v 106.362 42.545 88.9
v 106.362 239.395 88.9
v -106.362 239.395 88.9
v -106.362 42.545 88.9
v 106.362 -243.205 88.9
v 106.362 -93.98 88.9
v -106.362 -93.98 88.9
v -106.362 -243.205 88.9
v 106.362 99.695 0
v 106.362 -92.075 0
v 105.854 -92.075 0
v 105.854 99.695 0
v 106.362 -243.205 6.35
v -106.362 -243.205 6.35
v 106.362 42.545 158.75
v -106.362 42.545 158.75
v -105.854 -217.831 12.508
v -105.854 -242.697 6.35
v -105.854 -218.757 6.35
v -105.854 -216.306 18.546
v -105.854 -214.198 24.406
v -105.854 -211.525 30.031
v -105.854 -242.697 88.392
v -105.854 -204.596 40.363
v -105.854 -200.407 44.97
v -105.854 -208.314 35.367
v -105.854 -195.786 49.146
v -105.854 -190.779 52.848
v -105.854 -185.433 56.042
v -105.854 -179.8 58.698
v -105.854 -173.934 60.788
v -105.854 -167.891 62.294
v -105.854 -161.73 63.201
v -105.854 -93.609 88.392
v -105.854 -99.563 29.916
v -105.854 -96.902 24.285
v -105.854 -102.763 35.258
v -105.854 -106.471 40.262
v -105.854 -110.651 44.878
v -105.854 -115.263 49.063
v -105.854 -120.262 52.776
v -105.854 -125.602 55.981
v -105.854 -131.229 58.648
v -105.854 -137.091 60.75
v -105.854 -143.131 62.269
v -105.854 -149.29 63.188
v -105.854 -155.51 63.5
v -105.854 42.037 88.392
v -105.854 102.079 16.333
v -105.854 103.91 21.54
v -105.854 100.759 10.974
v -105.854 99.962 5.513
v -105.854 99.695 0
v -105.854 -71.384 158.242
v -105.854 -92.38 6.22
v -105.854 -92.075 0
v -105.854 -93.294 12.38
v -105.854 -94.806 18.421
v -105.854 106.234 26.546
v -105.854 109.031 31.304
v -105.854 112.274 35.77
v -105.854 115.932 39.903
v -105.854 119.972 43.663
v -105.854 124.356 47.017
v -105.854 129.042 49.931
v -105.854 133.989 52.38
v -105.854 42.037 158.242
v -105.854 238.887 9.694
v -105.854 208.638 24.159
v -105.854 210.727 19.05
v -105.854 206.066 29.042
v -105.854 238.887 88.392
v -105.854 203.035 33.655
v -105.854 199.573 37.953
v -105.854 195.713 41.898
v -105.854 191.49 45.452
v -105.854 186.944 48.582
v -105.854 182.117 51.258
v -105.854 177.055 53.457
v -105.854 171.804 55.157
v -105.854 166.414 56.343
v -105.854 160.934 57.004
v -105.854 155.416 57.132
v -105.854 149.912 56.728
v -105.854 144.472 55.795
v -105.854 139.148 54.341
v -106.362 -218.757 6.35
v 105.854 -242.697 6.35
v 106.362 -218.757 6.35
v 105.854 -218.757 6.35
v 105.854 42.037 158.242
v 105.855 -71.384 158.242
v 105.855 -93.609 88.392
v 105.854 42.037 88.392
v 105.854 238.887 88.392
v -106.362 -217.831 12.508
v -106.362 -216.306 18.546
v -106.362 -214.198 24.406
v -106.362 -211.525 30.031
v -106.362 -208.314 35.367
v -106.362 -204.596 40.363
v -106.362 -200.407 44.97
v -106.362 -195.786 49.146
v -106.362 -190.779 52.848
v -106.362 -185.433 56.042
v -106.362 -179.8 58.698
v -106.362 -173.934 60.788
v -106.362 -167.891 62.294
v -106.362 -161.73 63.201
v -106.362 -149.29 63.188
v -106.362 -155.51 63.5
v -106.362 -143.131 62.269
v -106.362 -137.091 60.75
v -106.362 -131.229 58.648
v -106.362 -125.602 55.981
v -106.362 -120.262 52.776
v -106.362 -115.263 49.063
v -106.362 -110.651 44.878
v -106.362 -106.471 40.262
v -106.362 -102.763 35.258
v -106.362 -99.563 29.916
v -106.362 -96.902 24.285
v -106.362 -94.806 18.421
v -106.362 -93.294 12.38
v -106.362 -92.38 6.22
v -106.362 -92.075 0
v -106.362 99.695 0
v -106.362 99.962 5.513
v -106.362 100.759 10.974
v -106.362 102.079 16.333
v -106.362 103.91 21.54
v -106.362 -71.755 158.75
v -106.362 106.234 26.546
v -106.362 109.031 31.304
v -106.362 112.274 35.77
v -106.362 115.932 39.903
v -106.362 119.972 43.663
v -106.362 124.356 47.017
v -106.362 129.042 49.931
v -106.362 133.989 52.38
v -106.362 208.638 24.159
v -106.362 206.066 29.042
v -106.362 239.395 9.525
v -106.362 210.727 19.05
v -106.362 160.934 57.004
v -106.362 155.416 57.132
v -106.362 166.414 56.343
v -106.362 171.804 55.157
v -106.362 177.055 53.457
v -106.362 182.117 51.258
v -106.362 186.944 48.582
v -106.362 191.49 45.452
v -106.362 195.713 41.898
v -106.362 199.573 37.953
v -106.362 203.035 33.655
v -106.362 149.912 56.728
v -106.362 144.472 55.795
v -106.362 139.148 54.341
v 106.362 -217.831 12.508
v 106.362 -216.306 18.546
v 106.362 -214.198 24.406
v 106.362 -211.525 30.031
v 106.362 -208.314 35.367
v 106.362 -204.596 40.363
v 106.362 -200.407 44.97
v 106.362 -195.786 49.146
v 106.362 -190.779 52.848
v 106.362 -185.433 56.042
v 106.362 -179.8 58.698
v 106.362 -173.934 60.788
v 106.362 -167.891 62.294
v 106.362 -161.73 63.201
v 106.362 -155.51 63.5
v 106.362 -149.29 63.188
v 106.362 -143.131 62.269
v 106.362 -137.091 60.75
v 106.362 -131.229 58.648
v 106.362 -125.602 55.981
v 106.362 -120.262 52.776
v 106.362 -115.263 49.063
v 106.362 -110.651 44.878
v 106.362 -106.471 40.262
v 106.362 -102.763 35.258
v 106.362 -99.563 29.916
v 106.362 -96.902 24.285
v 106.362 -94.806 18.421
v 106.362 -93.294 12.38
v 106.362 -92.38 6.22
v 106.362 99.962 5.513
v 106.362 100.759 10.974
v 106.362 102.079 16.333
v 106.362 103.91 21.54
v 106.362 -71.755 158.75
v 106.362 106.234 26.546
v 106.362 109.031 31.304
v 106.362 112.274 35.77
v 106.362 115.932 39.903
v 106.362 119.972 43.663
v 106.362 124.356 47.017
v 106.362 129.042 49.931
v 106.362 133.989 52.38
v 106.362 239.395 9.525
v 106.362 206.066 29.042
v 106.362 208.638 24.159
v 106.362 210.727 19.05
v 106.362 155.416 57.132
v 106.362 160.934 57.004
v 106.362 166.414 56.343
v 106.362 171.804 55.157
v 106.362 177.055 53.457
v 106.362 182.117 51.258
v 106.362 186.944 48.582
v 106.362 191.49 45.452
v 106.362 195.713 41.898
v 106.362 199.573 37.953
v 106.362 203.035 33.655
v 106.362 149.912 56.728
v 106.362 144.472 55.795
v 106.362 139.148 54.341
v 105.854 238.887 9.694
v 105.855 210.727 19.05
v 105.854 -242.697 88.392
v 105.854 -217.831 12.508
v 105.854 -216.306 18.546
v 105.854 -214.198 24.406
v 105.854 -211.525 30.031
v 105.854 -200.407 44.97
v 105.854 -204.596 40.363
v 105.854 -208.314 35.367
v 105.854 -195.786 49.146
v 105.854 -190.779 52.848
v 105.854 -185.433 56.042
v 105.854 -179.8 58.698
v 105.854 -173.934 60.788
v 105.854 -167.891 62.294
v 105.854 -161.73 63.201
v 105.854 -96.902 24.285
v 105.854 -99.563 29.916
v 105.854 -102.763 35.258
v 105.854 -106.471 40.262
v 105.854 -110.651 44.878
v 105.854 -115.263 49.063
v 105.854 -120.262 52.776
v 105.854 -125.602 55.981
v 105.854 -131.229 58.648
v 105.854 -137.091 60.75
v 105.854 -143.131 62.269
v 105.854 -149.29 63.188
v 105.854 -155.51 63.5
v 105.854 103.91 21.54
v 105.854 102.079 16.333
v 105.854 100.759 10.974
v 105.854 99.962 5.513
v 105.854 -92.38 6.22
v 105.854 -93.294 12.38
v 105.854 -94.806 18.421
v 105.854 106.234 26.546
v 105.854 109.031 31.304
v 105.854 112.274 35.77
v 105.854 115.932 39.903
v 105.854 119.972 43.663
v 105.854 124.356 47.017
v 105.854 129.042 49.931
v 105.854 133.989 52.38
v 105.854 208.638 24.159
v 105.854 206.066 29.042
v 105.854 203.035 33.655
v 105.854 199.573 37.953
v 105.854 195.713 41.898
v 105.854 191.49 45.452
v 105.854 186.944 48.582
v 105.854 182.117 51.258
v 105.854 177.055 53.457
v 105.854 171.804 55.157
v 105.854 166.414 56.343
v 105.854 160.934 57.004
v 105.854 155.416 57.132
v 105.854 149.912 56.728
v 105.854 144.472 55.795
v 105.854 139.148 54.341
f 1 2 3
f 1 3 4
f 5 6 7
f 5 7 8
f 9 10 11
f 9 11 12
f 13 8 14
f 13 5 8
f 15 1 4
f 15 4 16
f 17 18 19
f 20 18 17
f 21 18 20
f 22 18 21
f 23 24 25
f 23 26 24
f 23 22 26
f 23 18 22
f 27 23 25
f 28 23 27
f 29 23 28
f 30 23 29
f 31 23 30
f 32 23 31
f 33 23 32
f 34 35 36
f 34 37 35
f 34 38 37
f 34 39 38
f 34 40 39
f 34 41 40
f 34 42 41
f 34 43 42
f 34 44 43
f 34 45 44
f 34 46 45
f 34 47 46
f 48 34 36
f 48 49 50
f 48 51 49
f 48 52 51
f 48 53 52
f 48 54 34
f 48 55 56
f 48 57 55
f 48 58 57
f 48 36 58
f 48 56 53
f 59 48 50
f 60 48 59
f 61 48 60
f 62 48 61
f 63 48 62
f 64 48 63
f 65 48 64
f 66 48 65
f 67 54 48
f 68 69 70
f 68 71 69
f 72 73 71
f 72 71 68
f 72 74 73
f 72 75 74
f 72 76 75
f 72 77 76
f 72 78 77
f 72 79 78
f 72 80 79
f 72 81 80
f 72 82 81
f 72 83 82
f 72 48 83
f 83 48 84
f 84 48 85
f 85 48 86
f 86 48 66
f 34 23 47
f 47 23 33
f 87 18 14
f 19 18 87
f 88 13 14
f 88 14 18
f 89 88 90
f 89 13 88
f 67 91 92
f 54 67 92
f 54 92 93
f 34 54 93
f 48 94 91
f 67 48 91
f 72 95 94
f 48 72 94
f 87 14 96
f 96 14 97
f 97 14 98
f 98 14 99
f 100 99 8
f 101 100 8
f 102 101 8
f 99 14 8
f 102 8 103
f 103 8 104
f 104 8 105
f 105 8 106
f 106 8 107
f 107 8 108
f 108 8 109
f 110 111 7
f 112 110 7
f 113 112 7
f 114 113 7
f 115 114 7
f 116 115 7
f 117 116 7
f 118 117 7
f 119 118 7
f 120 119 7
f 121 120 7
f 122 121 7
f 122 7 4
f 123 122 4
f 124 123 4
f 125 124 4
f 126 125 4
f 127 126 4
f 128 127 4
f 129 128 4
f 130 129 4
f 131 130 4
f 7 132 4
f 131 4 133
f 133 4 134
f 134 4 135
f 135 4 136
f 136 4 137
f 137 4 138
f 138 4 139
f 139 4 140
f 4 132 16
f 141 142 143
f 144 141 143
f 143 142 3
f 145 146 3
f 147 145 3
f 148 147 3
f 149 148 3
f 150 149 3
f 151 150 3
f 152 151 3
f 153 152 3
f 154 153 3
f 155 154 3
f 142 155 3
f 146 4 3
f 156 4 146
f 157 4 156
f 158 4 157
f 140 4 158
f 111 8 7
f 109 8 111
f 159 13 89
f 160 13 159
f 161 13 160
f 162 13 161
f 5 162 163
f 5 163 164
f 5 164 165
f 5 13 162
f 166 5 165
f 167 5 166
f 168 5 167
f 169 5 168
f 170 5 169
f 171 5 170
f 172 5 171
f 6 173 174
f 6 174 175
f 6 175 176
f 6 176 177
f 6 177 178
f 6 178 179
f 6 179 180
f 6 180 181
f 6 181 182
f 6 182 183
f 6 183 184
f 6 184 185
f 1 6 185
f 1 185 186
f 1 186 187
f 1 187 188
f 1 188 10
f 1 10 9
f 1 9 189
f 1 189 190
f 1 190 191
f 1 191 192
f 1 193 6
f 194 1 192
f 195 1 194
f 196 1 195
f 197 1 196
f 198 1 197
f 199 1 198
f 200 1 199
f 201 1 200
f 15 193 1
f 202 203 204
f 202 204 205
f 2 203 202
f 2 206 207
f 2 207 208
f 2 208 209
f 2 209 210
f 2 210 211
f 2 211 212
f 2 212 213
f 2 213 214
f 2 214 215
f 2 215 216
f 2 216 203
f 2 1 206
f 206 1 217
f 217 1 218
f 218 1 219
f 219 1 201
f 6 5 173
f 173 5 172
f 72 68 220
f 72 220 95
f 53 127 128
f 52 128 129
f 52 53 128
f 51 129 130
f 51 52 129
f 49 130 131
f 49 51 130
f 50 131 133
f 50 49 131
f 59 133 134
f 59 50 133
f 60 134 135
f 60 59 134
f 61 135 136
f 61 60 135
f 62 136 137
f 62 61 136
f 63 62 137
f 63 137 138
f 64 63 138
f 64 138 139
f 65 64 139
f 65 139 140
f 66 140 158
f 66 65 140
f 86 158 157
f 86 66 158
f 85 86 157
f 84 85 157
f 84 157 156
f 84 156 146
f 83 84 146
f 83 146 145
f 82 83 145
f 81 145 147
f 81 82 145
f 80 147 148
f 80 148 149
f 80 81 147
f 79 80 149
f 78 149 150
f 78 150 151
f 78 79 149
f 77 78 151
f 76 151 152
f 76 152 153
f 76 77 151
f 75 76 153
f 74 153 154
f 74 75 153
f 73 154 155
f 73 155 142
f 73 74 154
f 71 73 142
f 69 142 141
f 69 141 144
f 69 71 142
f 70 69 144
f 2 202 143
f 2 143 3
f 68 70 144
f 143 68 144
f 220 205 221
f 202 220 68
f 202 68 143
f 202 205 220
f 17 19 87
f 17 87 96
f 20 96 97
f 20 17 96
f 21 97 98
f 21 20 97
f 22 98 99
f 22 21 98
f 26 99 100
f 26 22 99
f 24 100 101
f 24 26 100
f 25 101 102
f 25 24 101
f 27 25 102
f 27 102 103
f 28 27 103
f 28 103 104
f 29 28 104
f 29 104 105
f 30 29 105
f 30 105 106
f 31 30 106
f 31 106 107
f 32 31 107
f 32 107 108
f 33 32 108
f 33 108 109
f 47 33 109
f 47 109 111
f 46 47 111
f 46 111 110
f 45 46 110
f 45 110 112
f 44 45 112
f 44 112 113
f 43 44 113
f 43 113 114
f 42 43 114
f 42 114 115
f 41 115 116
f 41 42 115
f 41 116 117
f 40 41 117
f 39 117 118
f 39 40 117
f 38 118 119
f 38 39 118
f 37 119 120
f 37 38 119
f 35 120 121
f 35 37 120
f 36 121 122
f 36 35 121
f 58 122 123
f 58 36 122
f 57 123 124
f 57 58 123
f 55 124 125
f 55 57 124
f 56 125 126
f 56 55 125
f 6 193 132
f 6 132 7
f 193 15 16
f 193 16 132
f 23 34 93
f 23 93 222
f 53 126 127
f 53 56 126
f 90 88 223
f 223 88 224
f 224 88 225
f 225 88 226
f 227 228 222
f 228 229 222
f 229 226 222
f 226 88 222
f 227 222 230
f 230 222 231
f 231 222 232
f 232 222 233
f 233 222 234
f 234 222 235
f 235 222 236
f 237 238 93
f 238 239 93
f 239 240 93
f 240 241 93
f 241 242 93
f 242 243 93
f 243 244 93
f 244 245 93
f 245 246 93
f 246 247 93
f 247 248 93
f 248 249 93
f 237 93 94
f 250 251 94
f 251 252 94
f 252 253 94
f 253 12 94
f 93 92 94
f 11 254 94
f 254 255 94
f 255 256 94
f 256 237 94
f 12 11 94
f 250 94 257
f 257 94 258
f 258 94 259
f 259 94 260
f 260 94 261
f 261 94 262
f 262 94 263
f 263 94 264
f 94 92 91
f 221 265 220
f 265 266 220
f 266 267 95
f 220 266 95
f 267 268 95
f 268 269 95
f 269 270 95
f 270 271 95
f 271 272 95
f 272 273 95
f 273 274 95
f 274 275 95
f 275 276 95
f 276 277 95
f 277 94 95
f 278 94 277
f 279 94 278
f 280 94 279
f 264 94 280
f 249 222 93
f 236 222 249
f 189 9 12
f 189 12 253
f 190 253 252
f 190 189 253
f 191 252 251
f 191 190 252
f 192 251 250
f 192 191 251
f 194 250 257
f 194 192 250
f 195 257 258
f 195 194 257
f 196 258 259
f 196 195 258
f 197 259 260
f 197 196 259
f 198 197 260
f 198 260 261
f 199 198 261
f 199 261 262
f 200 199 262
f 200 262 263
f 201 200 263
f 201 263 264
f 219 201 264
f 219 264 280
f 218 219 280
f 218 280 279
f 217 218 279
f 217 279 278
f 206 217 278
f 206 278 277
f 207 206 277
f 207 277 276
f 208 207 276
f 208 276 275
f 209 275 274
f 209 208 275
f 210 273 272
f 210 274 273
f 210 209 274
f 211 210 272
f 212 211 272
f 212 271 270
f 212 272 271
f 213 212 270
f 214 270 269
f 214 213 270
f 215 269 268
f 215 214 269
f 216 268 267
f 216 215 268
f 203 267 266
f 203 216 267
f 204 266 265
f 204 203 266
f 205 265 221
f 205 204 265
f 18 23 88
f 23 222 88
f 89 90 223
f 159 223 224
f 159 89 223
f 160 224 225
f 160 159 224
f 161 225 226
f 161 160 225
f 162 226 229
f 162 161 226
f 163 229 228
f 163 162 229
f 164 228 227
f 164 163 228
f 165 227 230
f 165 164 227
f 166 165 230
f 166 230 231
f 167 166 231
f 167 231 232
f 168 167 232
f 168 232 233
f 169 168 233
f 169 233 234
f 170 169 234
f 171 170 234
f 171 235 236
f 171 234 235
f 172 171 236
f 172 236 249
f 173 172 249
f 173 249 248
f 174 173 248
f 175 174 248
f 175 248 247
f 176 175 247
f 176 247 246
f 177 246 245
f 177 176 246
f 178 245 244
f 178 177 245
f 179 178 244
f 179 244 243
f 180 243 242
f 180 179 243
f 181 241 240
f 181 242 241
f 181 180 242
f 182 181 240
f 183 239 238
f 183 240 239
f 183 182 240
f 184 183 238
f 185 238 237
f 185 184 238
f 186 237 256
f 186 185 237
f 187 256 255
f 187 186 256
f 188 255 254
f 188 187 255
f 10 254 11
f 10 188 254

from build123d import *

# Parameters (mm, degrees)
F1_DEPTH = 106.3625
F2_T     = -0.508


with BuildPart() as f1:
    # F0 (on Right) → F1 (new body, symmetric)
    with BuildSketch(Plane.YZ):
        with BuildLine():
            ThreePointArc((-218.7567022563, 6.35), (-152.3960137837, 63.4203756425), (-92.075, 0))
            Line((-92.075, 0), (0, 0))
            Line((0, 0), (99.695, 0))
            ThreePointArc((99.695, 0), (147.1808219158, 56.3269576842), (210.7265367264, 19.05))
            Line((210.7265367264, 19.05), (239.395, 9.525))
            Line((239.395, 9.525), (239.395, 88.9))
            Line((239.395, 88.9), (42.545, 88.9))
            Line((42.545, 88.9), (42.545, 158.75))
            Line((42.545, 158.75), (-71.755, 158.75))
            Line((-71.755, 158.75), (-93.98, 88.9))
            Line((-93.98, 88.9), (-243.205, 88.9))
            Line((-243.205, 88.9), (-243.205, 6.35))
            Line((-243.205, 6.35), (-218.7567022563, 6.35))
        make_face()
    extrude(amount=F1_DEPTH, both=True)

    # F2
    f2_openings = [f1.faces().sort_by_distance(p)[0] for p in [
        (0, 3.81, 0),
        (0, 147.180822, 56.326958),
        (0, 225.060768, 14.2875),
        (0, -152.396014, 63.420376),
        (0, -230.980851, 6.35),
    ]]
    offset(amount=F2_T, openings=f2_openings, kind=Kind.INTERSECTION)


solid = f1.part
